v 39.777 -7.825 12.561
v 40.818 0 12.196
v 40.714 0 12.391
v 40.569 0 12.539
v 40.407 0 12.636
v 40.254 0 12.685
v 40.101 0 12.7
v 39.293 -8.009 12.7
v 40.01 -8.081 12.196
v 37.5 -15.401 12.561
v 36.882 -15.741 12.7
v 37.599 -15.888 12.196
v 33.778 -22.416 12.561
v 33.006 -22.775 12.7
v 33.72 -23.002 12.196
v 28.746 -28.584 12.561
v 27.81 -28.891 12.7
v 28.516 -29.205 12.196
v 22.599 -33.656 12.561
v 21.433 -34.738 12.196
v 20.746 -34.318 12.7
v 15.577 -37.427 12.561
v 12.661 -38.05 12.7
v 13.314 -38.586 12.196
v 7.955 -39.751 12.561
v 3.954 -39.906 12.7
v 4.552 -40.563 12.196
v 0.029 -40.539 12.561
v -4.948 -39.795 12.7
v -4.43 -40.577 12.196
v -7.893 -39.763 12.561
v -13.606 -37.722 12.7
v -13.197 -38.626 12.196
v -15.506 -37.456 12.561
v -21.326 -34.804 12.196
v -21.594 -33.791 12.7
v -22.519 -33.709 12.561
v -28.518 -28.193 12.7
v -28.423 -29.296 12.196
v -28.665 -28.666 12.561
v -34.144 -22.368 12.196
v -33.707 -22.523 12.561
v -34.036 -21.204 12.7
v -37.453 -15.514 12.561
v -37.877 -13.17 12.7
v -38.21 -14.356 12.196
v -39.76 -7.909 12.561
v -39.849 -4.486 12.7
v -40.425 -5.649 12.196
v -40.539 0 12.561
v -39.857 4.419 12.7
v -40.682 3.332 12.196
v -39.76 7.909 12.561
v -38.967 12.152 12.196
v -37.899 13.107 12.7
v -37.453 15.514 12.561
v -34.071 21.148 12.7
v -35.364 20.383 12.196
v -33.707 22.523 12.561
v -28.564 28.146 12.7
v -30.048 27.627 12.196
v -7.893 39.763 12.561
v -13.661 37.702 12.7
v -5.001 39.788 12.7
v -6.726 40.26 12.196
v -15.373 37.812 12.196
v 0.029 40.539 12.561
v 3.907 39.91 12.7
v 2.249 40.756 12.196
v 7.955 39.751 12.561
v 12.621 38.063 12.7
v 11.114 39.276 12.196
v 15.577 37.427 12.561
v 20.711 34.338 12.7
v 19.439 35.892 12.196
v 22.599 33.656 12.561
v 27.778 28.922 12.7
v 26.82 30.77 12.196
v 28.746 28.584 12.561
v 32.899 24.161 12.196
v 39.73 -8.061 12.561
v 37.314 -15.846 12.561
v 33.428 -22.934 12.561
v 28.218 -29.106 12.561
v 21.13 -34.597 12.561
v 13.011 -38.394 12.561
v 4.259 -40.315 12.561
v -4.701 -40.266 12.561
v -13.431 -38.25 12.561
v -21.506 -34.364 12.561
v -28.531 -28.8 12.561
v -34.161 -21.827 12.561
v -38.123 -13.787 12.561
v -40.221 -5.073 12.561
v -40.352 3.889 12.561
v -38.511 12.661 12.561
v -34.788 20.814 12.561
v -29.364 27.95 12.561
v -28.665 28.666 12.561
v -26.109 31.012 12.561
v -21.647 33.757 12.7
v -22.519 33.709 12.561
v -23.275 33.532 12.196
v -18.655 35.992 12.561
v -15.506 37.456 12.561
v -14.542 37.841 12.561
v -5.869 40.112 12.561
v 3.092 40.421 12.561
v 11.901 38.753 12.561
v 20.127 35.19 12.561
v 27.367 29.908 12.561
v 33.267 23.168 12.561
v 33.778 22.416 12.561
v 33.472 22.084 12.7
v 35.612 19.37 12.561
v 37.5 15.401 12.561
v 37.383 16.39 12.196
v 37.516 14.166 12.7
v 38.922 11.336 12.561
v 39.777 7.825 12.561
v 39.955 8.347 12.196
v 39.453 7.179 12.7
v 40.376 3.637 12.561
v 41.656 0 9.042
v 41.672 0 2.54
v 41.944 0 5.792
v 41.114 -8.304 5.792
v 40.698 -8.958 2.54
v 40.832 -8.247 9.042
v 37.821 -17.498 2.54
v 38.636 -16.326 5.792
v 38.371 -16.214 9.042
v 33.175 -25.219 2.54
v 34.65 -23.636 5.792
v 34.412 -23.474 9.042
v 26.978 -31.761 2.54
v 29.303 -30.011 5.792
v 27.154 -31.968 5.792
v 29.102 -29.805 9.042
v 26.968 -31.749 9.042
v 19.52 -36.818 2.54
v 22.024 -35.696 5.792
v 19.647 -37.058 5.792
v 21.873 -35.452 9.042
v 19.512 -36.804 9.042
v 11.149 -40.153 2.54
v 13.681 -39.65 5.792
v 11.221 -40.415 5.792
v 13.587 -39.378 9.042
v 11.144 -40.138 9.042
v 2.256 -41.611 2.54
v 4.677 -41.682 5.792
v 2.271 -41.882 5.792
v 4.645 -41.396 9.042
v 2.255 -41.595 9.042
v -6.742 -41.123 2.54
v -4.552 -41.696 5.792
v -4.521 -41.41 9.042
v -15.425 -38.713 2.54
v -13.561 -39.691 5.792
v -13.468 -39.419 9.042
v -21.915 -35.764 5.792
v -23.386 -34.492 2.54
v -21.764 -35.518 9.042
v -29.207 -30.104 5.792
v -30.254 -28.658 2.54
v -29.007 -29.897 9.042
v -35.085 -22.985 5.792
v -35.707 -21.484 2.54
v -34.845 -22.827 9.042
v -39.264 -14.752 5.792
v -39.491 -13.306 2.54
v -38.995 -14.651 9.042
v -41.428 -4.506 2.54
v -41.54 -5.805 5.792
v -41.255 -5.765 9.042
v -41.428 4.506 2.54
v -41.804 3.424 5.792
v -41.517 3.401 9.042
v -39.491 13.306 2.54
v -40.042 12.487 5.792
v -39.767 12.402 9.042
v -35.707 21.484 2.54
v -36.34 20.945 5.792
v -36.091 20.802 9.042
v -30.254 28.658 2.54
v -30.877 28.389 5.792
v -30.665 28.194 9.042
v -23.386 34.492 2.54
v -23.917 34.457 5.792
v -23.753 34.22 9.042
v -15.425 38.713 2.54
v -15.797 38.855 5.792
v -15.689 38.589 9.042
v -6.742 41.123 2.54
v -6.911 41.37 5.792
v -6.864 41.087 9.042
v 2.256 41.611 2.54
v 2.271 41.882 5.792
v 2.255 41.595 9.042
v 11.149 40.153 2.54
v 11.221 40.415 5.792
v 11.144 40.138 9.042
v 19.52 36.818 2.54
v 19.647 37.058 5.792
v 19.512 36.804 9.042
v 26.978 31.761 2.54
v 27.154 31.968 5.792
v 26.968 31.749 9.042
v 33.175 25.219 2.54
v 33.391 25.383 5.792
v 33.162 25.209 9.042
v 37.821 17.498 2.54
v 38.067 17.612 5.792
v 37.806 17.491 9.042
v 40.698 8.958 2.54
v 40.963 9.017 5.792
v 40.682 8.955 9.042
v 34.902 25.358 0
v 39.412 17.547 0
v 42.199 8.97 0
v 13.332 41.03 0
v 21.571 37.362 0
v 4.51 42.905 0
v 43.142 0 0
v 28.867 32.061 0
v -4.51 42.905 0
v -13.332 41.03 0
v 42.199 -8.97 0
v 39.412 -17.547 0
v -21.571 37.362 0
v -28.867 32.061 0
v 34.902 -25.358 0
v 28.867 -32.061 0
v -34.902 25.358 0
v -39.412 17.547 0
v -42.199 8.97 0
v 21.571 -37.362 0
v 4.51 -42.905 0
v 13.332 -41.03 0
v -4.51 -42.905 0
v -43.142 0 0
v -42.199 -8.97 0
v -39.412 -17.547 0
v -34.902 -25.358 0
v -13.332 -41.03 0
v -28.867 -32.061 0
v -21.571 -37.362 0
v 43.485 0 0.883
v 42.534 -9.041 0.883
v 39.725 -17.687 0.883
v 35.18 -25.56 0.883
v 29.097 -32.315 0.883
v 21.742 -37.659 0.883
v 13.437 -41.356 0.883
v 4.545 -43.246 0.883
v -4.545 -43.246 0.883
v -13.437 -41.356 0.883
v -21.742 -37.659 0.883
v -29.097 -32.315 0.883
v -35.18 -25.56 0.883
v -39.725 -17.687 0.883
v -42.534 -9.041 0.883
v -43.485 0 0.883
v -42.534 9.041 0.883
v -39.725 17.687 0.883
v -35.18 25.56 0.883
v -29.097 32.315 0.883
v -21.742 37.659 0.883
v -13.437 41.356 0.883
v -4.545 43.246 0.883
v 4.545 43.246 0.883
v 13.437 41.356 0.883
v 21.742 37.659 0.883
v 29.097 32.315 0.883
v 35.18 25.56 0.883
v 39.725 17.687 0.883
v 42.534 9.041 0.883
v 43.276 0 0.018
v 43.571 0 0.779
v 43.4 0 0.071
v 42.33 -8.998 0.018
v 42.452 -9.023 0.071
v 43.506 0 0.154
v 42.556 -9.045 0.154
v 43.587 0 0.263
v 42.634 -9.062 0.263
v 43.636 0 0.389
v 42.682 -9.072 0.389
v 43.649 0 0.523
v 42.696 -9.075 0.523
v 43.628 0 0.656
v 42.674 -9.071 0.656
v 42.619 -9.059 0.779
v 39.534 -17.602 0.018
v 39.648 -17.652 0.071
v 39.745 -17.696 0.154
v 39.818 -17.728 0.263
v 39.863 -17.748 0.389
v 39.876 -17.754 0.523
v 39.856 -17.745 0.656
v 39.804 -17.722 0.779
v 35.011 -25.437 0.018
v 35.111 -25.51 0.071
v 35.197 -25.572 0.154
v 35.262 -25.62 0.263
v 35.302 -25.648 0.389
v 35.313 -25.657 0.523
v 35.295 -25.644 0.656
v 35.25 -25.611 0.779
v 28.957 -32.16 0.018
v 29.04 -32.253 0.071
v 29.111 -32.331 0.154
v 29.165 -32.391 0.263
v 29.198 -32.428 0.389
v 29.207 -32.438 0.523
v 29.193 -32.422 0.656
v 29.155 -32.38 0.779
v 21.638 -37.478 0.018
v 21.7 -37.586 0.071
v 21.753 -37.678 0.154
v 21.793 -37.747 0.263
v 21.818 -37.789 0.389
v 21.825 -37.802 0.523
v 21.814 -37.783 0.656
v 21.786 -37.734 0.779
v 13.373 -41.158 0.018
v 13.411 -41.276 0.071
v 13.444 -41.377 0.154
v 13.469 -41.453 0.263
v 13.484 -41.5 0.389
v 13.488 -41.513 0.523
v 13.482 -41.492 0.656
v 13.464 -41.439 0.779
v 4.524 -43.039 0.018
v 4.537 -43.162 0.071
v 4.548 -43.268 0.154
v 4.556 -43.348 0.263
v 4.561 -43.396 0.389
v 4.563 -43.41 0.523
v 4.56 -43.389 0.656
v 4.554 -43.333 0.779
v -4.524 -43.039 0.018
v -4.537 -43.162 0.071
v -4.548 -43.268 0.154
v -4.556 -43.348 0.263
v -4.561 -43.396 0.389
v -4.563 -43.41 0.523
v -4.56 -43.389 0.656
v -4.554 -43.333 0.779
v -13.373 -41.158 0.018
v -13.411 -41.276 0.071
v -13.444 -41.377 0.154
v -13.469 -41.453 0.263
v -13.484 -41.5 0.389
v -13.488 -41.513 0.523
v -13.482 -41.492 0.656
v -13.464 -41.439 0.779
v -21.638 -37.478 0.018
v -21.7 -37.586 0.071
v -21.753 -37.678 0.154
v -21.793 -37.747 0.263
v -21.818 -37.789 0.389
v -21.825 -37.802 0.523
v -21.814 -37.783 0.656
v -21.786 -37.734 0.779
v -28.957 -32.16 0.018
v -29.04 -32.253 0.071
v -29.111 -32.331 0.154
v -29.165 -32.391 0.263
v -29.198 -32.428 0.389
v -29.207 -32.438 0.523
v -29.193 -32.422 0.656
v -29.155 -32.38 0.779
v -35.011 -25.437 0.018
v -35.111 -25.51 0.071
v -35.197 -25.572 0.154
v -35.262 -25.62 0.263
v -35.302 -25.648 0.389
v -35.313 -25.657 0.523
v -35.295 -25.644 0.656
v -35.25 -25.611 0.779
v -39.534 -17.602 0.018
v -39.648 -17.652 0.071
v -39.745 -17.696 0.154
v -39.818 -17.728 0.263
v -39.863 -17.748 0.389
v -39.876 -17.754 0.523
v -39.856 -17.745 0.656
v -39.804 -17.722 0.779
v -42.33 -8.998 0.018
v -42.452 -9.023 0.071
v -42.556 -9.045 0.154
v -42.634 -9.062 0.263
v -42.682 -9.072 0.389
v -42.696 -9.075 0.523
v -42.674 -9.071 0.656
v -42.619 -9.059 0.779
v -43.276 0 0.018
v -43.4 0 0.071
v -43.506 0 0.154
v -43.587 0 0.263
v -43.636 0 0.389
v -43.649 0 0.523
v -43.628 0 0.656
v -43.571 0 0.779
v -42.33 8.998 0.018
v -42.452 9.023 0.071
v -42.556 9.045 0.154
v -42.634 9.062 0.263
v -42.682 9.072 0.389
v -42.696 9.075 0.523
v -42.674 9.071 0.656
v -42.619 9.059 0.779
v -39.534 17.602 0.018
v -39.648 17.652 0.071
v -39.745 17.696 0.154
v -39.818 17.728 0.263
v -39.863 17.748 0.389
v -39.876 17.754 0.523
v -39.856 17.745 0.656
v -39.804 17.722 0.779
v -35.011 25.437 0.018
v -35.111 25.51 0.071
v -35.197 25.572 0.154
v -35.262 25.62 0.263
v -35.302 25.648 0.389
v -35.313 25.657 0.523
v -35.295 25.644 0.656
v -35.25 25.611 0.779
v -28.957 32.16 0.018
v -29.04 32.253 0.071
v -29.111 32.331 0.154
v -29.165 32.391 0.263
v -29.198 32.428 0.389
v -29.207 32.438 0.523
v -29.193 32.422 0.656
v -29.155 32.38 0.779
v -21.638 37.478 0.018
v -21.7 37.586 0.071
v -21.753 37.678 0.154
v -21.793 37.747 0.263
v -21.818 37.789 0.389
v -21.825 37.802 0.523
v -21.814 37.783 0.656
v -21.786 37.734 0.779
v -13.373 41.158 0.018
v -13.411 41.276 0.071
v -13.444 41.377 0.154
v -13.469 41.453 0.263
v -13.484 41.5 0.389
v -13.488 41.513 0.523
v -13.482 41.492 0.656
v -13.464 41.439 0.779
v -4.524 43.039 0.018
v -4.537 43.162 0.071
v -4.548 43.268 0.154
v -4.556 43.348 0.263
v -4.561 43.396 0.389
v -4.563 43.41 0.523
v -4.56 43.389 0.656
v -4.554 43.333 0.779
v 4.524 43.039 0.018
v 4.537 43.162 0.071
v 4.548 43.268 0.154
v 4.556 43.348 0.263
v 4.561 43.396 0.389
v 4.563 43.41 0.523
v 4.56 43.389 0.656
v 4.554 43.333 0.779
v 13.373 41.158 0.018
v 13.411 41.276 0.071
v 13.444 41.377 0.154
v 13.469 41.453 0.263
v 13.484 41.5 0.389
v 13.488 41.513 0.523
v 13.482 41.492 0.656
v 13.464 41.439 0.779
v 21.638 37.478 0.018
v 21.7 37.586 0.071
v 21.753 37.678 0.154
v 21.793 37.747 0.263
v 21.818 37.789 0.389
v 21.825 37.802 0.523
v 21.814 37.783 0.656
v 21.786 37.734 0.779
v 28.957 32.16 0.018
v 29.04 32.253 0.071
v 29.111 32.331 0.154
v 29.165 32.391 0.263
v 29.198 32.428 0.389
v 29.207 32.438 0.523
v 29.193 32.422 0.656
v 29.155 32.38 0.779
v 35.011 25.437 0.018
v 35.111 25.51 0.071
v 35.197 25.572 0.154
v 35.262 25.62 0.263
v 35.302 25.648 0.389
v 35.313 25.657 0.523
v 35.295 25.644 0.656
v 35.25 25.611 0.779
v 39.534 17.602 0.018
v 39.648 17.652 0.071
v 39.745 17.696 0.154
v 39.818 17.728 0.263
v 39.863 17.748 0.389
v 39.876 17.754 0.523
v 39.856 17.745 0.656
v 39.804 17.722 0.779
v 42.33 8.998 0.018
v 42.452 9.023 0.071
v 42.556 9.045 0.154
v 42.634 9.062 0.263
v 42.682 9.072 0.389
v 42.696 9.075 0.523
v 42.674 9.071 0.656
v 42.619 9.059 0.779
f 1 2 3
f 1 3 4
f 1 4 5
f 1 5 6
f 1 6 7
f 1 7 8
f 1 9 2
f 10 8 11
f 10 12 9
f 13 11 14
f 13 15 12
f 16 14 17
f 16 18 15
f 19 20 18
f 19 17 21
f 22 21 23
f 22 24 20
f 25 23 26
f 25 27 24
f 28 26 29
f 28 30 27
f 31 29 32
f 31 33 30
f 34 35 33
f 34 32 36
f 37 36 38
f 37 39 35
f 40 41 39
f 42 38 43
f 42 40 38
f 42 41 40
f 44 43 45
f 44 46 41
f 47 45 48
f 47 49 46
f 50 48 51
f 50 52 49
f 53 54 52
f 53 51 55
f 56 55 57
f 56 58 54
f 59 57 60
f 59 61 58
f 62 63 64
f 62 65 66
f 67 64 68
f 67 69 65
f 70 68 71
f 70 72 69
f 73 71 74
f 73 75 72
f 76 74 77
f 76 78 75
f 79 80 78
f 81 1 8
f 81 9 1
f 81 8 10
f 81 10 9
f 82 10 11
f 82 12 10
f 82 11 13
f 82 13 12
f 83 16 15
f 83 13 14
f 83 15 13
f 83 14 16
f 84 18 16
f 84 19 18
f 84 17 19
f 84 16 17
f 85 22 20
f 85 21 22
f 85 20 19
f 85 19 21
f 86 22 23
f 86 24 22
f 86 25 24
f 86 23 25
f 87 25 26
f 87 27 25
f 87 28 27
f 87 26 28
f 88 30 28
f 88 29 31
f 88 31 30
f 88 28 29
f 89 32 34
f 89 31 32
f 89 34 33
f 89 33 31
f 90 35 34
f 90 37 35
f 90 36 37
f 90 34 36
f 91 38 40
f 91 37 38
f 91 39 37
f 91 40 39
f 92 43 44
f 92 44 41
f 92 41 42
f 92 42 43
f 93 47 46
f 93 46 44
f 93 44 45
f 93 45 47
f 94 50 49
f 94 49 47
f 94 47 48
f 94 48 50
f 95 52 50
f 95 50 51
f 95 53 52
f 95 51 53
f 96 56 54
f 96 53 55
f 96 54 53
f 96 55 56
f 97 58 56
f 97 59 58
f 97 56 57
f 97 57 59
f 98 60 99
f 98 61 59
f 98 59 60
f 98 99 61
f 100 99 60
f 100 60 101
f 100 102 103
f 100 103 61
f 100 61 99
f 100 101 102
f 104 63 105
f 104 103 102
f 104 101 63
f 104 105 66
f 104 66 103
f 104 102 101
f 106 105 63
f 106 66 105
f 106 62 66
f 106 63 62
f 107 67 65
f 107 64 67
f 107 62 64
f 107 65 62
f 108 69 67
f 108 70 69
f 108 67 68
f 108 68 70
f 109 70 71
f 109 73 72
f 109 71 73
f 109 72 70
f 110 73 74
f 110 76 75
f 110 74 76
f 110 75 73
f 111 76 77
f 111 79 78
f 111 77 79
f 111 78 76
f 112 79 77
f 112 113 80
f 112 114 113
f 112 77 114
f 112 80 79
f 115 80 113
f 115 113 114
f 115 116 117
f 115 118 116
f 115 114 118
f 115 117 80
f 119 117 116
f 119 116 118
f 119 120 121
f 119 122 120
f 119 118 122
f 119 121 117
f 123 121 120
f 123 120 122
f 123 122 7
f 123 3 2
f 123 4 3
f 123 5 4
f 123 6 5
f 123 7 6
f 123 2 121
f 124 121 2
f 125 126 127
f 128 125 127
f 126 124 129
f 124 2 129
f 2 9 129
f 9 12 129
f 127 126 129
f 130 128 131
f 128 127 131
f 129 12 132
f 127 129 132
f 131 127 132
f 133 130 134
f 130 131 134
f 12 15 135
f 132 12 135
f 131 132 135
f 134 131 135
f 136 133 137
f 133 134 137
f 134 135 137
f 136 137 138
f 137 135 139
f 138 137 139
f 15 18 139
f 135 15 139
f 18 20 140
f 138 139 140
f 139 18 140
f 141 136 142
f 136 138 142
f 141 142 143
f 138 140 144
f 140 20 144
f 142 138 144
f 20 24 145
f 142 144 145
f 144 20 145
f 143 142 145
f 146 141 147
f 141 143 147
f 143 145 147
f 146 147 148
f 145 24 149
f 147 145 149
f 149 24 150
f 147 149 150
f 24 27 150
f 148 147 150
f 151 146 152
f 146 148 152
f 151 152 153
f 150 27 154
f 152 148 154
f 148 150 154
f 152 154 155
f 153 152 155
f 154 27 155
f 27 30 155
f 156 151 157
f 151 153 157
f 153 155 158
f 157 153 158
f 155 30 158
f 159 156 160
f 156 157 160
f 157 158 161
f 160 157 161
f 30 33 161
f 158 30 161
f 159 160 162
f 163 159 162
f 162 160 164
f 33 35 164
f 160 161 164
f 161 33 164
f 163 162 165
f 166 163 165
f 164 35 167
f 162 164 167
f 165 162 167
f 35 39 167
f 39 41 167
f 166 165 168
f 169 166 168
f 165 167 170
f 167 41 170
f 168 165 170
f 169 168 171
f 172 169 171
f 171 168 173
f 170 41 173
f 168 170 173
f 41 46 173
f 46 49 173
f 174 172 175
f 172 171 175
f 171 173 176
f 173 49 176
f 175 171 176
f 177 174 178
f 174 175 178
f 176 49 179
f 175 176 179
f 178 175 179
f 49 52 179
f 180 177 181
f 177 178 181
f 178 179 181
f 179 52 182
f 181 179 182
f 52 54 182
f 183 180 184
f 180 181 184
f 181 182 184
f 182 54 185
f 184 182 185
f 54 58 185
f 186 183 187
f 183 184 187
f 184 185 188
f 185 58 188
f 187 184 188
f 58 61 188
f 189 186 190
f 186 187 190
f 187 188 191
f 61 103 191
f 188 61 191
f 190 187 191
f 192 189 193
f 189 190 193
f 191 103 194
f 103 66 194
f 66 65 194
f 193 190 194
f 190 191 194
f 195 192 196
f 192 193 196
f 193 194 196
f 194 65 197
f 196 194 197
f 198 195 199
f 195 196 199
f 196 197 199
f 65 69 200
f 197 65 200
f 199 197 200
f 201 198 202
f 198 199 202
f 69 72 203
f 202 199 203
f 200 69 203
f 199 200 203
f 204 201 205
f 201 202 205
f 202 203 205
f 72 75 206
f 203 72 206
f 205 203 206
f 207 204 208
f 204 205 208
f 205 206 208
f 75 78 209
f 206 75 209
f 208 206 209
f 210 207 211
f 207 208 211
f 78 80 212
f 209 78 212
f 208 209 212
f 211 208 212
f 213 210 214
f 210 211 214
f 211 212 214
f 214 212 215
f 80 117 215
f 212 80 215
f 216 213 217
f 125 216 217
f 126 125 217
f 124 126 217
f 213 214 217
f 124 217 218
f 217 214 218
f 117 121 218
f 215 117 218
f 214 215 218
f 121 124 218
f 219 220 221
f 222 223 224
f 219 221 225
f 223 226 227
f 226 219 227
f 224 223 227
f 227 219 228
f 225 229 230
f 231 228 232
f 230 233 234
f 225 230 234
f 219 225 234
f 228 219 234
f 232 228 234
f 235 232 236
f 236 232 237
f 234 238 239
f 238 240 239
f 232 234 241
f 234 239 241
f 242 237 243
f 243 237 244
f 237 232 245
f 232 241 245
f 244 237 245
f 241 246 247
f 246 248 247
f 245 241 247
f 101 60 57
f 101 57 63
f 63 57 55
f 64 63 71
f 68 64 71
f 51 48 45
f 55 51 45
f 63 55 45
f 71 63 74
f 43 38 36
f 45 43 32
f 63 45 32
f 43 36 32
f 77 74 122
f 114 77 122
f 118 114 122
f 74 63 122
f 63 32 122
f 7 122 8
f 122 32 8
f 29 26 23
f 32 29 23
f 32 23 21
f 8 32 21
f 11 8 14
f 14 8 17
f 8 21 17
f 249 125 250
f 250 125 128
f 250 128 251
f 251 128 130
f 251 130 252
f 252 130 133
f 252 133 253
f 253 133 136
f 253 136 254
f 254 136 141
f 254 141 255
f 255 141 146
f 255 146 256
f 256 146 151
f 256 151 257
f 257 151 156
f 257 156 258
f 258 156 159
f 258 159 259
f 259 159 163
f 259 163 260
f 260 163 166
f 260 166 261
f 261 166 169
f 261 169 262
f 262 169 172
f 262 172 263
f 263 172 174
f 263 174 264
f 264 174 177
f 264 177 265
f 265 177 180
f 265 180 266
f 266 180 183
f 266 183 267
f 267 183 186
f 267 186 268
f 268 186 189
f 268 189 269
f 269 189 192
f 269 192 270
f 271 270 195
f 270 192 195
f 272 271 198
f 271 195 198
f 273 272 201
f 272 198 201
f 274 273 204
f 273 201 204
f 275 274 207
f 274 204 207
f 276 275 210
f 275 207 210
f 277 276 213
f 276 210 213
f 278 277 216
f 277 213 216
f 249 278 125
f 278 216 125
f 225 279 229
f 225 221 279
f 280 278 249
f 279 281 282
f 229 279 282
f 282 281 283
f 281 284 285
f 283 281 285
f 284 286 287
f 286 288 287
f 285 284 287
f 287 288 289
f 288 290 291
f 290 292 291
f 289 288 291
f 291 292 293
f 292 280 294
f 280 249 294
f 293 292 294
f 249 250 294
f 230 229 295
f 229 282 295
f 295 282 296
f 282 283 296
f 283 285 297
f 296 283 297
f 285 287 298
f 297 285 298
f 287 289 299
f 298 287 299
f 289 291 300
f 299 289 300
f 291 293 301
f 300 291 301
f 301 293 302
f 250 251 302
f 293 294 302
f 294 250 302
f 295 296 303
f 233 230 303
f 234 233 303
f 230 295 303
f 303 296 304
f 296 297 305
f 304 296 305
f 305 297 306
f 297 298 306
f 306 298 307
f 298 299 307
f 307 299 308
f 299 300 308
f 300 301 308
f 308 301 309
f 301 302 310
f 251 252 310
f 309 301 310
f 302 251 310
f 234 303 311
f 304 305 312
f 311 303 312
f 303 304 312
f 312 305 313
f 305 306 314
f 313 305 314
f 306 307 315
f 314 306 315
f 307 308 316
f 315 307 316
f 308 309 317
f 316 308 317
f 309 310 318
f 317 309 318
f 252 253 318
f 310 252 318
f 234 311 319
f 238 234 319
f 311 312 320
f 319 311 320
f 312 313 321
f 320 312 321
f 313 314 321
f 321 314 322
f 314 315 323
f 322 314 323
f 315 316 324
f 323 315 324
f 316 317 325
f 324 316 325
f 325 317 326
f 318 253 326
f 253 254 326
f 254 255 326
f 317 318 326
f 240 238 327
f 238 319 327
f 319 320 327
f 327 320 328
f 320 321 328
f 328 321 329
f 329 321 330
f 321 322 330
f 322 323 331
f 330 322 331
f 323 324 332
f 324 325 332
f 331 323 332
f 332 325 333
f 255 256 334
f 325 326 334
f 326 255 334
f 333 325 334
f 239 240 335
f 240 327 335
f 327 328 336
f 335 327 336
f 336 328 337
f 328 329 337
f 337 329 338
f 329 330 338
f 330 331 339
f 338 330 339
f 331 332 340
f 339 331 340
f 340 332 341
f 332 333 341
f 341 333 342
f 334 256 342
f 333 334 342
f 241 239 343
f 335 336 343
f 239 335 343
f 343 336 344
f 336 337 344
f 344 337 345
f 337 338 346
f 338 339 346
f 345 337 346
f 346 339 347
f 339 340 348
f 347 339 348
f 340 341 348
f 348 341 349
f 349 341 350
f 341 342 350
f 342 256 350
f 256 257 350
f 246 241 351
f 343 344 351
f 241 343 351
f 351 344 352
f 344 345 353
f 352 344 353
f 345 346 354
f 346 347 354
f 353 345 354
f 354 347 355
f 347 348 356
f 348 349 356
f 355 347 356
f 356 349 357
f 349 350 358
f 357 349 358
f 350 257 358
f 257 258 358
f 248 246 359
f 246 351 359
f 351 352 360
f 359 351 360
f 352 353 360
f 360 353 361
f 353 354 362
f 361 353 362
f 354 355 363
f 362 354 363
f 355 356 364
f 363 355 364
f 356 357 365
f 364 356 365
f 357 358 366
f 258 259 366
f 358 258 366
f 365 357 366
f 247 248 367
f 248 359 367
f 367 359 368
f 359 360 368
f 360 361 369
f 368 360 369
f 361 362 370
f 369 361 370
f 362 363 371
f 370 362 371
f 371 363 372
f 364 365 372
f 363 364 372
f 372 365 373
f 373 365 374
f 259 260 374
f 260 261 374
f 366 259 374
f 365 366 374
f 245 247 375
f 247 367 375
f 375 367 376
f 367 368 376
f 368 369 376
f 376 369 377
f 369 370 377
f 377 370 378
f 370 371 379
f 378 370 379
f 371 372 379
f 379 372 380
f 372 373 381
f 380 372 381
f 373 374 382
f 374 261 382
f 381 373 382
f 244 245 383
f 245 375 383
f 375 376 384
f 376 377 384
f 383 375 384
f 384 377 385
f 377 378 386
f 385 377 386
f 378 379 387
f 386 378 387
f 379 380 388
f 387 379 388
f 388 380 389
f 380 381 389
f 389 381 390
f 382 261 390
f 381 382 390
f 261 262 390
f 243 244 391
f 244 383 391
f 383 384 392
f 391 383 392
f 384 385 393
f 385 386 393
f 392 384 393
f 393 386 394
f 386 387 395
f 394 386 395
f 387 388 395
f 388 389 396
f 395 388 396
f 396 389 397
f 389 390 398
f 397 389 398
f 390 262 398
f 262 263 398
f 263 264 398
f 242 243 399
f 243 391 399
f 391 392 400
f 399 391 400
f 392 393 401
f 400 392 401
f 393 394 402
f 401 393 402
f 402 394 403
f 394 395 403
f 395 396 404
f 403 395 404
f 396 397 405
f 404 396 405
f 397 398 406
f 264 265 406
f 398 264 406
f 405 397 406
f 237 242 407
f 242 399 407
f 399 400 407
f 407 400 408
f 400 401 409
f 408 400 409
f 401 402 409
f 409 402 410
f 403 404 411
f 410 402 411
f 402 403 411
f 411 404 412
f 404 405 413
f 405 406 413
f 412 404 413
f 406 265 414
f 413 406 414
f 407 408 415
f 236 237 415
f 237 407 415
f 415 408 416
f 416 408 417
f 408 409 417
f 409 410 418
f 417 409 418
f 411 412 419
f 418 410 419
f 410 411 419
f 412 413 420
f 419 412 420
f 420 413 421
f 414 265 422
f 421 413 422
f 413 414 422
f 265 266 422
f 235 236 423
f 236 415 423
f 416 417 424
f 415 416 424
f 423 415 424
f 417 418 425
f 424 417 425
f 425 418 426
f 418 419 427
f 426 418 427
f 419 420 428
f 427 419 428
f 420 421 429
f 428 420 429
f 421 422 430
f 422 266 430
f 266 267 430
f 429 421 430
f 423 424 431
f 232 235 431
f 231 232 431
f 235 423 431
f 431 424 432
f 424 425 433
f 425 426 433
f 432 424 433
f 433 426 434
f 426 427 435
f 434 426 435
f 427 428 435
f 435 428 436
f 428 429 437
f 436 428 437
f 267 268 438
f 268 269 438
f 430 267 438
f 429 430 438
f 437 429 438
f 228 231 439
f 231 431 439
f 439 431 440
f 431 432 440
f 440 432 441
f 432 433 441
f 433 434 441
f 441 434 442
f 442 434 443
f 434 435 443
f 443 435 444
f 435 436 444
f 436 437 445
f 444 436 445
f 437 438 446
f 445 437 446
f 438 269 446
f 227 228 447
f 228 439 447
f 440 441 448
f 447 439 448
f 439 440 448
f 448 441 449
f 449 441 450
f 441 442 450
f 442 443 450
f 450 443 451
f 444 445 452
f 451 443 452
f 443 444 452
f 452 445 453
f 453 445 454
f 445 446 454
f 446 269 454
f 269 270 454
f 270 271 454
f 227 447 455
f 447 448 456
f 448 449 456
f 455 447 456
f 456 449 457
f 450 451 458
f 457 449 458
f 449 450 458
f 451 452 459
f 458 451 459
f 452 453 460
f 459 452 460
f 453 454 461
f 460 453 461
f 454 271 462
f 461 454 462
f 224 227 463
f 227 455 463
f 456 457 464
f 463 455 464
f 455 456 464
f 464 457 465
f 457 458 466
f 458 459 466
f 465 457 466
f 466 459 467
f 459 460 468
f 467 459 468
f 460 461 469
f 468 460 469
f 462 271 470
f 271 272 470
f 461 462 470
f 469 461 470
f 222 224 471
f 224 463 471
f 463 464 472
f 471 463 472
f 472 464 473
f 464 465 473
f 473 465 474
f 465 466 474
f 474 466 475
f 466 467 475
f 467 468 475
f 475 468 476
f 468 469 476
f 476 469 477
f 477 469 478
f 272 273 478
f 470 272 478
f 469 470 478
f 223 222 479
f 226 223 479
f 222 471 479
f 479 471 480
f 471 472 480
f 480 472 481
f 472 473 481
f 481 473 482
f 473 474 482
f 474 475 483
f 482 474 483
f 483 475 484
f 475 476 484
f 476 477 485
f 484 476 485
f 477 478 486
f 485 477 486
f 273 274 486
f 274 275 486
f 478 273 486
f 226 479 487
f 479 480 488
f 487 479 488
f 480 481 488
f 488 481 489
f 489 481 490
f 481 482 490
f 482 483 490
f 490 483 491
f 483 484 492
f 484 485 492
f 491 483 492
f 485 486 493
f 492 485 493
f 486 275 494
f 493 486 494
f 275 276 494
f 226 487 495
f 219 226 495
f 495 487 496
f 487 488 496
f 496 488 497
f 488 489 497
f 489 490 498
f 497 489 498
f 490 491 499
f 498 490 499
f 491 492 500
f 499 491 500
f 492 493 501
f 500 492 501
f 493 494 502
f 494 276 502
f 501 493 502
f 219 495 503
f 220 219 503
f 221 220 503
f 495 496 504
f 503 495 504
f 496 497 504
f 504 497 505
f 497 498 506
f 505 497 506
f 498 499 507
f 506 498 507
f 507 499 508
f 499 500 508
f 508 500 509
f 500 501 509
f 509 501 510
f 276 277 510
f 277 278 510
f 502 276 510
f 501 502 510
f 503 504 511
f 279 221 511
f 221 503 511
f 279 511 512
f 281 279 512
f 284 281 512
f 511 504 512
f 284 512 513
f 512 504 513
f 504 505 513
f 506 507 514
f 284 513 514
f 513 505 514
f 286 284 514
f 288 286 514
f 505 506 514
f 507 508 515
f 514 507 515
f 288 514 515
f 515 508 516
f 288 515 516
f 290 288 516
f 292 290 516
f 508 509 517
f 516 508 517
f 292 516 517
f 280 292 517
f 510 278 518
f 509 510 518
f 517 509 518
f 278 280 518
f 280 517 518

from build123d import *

# Parameters (mm, degrees)
F2_R = 0.508
F3_R = 0.762


with BuildPart() as f1:
    # F0 (on Front) → F1 (revolve)
    with BuildSketch(Plane.XZ):
        with BuildLine():
            Line((40.6285012155, 12.7), (0, 12.7))
            Line((0, 12.7), (0, 0))
            Line((0, 0), (44.45, 0))
            Line((44.45, 0), (41.672429197, 2.54))
            ThreePointArc((41.672429197, 2.54), (41.8440575591, 7.6912657938), (40.6285012155, 12.7))
        make_face()
    revolve(axis=Axis((0, 0, 5.215363577), (0, 0, -1)))

    # F2
    f2_edges = [f1.edges().sort_by_distance(p)[0] for p in [
        (-44.45, 0, 0),
    ]]
    fillet(f2_edges, radius=F2_R)

    # F3
    f3_edges = [f1.edges().sort_by_distance(p)[0] for p in [
        (-40.628501, 0, 12.7),
    ]]
    fillet(f3_edges, radius=F3_R)


solid = f1.part
